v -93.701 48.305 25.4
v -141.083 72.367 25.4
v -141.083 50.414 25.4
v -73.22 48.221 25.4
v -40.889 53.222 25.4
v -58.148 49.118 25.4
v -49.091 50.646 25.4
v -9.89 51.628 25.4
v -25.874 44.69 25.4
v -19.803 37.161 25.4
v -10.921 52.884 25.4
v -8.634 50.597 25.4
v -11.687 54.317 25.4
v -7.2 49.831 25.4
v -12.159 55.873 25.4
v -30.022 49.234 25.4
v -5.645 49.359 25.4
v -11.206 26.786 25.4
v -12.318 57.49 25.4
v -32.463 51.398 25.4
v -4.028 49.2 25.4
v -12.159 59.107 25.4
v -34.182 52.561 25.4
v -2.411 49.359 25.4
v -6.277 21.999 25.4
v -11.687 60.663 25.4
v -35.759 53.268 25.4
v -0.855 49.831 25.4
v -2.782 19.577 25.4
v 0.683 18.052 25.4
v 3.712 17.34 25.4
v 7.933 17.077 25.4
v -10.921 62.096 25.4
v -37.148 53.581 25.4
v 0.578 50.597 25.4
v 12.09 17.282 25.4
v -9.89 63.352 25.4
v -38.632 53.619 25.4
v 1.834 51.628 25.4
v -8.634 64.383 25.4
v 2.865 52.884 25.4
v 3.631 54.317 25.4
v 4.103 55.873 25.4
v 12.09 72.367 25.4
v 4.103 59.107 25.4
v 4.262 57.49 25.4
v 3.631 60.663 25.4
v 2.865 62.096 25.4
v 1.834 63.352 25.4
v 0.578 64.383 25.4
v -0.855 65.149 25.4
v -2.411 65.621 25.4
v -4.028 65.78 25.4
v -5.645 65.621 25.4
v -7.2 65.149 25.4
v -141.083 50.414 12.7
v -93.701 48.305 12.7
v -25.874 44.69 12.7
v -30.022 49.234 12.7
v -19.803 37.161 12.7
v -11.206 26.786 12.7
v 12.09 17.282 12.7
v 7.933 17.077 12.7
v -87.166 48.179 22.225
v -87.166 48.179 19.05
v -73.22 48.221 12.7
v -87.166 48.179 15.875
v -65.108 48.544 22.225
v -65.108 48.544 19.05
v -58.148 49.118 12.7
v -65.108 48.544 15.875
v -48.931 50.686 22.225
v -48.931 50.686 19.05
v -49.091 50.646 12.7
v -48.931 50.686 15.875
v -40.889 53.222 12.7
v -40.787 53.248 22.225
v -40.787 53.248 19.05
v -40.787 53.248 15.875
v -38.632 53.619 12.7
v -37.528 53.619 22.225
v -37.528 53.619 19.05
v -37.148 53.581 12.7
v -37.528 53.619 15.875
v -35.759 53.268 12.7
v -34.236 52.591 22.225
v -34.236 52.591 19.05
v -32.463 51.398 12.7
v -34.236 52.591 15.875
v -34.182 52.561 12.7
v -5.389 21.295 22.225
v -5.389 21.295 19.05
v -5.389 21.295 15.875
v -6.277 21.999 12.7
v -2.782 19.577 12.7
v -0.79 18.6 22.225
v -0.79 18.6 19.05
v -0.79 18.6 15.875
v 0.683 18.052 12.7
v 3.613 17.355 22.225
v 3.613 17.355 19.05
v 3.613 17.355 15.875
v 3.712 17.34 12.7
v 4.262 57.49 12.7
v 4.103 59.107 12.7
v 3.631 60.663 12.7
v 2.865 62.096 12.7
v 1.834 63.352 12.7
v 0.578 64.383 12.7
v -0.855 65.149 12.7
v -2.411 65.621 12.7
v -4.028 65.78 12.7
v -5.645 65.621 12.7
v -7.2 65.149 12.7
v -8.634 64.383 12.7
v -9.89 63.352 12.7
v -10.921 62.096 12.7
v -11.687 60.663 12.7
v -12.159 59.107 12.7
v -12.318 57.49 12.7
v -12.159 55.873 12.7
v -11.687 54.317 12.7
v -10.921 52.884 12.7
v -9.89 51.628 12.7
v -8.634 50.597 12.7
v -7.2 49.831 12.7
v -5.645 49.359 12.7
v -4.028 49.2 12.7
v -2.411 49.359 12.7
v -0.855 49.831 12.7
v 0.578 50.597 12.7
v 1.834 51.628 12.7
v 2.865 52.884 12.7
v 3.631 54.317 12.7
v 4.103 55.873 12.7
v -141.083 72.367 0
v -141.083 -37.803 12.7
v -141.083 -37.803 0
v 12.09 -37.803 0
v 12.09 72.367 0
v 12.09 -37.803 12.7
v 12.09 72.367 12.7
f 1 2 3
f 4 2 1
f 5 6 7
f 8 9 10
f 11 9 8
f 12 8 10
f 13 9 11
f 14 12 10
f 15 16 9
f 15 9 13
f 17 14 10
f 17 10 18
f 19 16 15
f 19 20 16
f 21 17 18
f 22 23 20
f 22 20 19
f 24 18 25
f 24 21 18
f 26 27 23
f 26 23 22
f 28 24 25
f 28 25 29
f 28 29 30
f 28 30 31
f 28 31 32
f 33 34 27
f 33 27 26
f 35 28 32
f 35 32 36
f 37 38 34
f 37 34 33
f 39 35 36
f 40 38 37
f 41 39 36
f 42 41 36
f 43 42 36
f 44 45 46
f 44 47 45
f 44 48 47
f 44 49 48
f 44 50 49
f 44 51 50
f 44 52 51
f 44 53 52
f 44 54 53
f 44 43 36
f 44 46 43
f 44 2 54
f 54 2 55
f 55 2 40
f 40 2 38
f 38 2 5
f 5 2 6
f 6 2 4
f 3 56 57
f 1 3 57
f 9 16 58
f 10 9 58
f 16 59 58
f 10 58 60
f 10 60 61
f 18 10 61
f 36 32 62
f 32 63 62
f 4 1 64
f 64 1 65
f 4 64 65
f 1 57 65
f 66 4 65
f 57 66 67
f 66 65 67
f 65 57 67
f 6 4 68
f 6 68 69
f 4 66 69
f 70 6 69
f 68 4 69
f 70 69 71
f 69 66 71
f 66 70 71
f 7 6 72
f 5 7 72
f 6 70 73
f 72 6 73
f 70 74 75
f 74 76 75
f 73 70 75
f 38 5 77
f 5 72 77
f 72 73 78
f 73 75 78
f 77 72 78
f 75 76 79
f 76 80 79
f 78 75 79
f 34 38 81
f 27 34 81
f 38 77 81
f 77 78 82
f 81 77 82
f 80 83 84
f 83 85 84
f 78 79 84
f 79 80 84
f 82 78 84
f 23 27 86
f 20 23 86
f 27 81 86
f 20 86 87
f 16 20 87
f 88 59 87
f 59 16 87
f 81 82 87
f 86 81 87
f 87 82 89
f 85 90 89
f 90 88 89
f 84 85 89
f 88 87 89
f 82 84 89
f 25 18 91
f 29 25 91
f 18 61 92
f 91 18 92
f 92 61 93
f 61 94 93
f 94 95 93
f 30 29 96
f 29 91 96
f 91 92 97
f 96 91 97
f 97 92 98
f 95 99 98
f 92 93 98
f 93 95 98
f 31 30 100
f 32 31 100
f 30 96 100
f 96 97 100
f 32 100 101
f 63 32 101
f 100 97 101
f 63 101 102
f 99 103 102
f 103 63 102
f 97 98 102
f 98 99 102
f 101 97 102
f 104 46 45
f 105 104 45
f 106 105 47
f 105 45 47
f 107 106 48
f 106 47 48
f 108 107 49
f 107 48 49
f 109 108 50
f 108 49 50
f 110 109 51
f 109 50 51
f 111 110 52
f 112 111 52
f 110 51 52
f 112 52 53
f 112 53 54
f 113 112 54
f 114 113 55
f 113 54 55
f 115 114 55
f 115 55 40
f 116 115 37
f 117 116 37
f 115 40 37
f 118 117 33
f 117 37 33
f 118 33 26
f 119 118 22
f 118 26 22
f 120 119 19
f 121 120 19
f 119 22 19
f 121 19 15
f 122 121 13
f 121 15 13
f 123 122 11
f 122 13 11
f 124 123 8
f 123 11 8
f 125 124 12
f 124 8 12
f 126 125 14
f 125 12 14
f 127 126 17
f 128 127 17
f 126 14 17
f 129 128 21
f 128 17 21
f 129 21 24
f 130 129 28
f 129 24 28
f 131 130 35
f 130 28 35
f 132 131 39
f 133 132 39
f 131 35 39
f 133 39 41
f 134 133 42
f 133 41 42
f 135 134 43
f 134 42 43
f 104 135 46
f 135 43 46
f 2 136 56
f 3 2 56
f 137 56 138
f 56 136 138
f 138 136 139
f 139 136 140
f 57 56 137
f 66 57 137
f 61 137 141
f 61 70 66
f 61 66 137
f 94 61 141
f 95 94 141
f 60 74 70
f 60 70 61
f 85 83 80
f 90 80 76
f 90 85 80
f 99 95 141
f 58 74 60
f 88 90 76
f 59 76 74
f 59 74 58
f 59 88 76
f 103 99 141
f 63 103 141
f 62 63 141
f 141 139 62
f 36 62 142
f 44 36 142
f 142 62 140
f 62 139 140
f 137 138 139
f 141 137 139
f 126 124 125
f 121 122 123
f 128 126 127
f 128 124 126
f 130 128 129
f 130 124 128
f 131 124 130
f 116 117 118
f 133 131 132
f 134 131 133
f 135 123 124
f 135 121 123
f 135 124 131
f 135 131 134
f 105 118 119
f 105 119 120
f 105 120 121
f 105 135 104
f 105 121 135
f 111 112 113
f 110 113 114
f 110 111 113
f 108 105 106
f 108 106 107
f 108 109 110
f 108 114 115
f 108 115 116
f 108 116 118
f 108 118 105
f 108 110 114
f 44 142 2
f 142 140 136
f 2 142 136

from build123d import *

# Parameters (mm, degrees)
F0_W     = 153.1731467694
F0_H     = 110.1697087288
F1_DEPTH = 12.7
F3_DEPTH = 12.7
F4_R     = 8.2903217001
F5_DEPTH = 12.7


with BuildPart() as f1:
    # F0 (on Top) → F1 (new body)
    with BuildSketch(Plane.XY):
        with Locations((-64.4964575768, 17.2817707062)):
            Rectangle(F0_W, F0_H)
    extrude(amount=F1_DEPTH)

    # F2 (on face) → F3 (join)
    with BuildSketch(Plane.XY.offset(12.7)):
        with BuildLine():
            Line((-141.0830309615, 72.3666250706), (-141.0830309615, 50.4142977297))
            add(Edge.make_bspline(
                [(-141.0830309615, 50.4142977297), (-103.395934181, 48.3975501002), (-50.5960336004, 45.5720717952), (-33.1345654521, 59.8055398639), (-7.7130214935, 15.9331957658), (6.4969246779, 16.9008796746), (12.090115808, 17.2817707062)],
                knots=[0, 0, 0, 0, 0.3965469516, 0.5555652042, 0.8250655753, 1, 1, 1, 1], degree=3))
            Line((12.090115808, 17.2817707062), (12.090115808, 72.3666250706))
            Line((12.090115808, 72.3666250706), (-141.0830309615, 72.3666250706))
        make_face()
    extrude(amount=F3_DEPTH)

    # F4 (on face) → F5 (cut)
    with BuildSketch(Plane.XY.offset(25.4)):
        with Locations((-4.0278891101, 57.4900098145)):
            Circle(F4_R)
    extrude(amount=-F5_DEPTH, mode=Mode.SUBTRACT)


solid = f1.part
